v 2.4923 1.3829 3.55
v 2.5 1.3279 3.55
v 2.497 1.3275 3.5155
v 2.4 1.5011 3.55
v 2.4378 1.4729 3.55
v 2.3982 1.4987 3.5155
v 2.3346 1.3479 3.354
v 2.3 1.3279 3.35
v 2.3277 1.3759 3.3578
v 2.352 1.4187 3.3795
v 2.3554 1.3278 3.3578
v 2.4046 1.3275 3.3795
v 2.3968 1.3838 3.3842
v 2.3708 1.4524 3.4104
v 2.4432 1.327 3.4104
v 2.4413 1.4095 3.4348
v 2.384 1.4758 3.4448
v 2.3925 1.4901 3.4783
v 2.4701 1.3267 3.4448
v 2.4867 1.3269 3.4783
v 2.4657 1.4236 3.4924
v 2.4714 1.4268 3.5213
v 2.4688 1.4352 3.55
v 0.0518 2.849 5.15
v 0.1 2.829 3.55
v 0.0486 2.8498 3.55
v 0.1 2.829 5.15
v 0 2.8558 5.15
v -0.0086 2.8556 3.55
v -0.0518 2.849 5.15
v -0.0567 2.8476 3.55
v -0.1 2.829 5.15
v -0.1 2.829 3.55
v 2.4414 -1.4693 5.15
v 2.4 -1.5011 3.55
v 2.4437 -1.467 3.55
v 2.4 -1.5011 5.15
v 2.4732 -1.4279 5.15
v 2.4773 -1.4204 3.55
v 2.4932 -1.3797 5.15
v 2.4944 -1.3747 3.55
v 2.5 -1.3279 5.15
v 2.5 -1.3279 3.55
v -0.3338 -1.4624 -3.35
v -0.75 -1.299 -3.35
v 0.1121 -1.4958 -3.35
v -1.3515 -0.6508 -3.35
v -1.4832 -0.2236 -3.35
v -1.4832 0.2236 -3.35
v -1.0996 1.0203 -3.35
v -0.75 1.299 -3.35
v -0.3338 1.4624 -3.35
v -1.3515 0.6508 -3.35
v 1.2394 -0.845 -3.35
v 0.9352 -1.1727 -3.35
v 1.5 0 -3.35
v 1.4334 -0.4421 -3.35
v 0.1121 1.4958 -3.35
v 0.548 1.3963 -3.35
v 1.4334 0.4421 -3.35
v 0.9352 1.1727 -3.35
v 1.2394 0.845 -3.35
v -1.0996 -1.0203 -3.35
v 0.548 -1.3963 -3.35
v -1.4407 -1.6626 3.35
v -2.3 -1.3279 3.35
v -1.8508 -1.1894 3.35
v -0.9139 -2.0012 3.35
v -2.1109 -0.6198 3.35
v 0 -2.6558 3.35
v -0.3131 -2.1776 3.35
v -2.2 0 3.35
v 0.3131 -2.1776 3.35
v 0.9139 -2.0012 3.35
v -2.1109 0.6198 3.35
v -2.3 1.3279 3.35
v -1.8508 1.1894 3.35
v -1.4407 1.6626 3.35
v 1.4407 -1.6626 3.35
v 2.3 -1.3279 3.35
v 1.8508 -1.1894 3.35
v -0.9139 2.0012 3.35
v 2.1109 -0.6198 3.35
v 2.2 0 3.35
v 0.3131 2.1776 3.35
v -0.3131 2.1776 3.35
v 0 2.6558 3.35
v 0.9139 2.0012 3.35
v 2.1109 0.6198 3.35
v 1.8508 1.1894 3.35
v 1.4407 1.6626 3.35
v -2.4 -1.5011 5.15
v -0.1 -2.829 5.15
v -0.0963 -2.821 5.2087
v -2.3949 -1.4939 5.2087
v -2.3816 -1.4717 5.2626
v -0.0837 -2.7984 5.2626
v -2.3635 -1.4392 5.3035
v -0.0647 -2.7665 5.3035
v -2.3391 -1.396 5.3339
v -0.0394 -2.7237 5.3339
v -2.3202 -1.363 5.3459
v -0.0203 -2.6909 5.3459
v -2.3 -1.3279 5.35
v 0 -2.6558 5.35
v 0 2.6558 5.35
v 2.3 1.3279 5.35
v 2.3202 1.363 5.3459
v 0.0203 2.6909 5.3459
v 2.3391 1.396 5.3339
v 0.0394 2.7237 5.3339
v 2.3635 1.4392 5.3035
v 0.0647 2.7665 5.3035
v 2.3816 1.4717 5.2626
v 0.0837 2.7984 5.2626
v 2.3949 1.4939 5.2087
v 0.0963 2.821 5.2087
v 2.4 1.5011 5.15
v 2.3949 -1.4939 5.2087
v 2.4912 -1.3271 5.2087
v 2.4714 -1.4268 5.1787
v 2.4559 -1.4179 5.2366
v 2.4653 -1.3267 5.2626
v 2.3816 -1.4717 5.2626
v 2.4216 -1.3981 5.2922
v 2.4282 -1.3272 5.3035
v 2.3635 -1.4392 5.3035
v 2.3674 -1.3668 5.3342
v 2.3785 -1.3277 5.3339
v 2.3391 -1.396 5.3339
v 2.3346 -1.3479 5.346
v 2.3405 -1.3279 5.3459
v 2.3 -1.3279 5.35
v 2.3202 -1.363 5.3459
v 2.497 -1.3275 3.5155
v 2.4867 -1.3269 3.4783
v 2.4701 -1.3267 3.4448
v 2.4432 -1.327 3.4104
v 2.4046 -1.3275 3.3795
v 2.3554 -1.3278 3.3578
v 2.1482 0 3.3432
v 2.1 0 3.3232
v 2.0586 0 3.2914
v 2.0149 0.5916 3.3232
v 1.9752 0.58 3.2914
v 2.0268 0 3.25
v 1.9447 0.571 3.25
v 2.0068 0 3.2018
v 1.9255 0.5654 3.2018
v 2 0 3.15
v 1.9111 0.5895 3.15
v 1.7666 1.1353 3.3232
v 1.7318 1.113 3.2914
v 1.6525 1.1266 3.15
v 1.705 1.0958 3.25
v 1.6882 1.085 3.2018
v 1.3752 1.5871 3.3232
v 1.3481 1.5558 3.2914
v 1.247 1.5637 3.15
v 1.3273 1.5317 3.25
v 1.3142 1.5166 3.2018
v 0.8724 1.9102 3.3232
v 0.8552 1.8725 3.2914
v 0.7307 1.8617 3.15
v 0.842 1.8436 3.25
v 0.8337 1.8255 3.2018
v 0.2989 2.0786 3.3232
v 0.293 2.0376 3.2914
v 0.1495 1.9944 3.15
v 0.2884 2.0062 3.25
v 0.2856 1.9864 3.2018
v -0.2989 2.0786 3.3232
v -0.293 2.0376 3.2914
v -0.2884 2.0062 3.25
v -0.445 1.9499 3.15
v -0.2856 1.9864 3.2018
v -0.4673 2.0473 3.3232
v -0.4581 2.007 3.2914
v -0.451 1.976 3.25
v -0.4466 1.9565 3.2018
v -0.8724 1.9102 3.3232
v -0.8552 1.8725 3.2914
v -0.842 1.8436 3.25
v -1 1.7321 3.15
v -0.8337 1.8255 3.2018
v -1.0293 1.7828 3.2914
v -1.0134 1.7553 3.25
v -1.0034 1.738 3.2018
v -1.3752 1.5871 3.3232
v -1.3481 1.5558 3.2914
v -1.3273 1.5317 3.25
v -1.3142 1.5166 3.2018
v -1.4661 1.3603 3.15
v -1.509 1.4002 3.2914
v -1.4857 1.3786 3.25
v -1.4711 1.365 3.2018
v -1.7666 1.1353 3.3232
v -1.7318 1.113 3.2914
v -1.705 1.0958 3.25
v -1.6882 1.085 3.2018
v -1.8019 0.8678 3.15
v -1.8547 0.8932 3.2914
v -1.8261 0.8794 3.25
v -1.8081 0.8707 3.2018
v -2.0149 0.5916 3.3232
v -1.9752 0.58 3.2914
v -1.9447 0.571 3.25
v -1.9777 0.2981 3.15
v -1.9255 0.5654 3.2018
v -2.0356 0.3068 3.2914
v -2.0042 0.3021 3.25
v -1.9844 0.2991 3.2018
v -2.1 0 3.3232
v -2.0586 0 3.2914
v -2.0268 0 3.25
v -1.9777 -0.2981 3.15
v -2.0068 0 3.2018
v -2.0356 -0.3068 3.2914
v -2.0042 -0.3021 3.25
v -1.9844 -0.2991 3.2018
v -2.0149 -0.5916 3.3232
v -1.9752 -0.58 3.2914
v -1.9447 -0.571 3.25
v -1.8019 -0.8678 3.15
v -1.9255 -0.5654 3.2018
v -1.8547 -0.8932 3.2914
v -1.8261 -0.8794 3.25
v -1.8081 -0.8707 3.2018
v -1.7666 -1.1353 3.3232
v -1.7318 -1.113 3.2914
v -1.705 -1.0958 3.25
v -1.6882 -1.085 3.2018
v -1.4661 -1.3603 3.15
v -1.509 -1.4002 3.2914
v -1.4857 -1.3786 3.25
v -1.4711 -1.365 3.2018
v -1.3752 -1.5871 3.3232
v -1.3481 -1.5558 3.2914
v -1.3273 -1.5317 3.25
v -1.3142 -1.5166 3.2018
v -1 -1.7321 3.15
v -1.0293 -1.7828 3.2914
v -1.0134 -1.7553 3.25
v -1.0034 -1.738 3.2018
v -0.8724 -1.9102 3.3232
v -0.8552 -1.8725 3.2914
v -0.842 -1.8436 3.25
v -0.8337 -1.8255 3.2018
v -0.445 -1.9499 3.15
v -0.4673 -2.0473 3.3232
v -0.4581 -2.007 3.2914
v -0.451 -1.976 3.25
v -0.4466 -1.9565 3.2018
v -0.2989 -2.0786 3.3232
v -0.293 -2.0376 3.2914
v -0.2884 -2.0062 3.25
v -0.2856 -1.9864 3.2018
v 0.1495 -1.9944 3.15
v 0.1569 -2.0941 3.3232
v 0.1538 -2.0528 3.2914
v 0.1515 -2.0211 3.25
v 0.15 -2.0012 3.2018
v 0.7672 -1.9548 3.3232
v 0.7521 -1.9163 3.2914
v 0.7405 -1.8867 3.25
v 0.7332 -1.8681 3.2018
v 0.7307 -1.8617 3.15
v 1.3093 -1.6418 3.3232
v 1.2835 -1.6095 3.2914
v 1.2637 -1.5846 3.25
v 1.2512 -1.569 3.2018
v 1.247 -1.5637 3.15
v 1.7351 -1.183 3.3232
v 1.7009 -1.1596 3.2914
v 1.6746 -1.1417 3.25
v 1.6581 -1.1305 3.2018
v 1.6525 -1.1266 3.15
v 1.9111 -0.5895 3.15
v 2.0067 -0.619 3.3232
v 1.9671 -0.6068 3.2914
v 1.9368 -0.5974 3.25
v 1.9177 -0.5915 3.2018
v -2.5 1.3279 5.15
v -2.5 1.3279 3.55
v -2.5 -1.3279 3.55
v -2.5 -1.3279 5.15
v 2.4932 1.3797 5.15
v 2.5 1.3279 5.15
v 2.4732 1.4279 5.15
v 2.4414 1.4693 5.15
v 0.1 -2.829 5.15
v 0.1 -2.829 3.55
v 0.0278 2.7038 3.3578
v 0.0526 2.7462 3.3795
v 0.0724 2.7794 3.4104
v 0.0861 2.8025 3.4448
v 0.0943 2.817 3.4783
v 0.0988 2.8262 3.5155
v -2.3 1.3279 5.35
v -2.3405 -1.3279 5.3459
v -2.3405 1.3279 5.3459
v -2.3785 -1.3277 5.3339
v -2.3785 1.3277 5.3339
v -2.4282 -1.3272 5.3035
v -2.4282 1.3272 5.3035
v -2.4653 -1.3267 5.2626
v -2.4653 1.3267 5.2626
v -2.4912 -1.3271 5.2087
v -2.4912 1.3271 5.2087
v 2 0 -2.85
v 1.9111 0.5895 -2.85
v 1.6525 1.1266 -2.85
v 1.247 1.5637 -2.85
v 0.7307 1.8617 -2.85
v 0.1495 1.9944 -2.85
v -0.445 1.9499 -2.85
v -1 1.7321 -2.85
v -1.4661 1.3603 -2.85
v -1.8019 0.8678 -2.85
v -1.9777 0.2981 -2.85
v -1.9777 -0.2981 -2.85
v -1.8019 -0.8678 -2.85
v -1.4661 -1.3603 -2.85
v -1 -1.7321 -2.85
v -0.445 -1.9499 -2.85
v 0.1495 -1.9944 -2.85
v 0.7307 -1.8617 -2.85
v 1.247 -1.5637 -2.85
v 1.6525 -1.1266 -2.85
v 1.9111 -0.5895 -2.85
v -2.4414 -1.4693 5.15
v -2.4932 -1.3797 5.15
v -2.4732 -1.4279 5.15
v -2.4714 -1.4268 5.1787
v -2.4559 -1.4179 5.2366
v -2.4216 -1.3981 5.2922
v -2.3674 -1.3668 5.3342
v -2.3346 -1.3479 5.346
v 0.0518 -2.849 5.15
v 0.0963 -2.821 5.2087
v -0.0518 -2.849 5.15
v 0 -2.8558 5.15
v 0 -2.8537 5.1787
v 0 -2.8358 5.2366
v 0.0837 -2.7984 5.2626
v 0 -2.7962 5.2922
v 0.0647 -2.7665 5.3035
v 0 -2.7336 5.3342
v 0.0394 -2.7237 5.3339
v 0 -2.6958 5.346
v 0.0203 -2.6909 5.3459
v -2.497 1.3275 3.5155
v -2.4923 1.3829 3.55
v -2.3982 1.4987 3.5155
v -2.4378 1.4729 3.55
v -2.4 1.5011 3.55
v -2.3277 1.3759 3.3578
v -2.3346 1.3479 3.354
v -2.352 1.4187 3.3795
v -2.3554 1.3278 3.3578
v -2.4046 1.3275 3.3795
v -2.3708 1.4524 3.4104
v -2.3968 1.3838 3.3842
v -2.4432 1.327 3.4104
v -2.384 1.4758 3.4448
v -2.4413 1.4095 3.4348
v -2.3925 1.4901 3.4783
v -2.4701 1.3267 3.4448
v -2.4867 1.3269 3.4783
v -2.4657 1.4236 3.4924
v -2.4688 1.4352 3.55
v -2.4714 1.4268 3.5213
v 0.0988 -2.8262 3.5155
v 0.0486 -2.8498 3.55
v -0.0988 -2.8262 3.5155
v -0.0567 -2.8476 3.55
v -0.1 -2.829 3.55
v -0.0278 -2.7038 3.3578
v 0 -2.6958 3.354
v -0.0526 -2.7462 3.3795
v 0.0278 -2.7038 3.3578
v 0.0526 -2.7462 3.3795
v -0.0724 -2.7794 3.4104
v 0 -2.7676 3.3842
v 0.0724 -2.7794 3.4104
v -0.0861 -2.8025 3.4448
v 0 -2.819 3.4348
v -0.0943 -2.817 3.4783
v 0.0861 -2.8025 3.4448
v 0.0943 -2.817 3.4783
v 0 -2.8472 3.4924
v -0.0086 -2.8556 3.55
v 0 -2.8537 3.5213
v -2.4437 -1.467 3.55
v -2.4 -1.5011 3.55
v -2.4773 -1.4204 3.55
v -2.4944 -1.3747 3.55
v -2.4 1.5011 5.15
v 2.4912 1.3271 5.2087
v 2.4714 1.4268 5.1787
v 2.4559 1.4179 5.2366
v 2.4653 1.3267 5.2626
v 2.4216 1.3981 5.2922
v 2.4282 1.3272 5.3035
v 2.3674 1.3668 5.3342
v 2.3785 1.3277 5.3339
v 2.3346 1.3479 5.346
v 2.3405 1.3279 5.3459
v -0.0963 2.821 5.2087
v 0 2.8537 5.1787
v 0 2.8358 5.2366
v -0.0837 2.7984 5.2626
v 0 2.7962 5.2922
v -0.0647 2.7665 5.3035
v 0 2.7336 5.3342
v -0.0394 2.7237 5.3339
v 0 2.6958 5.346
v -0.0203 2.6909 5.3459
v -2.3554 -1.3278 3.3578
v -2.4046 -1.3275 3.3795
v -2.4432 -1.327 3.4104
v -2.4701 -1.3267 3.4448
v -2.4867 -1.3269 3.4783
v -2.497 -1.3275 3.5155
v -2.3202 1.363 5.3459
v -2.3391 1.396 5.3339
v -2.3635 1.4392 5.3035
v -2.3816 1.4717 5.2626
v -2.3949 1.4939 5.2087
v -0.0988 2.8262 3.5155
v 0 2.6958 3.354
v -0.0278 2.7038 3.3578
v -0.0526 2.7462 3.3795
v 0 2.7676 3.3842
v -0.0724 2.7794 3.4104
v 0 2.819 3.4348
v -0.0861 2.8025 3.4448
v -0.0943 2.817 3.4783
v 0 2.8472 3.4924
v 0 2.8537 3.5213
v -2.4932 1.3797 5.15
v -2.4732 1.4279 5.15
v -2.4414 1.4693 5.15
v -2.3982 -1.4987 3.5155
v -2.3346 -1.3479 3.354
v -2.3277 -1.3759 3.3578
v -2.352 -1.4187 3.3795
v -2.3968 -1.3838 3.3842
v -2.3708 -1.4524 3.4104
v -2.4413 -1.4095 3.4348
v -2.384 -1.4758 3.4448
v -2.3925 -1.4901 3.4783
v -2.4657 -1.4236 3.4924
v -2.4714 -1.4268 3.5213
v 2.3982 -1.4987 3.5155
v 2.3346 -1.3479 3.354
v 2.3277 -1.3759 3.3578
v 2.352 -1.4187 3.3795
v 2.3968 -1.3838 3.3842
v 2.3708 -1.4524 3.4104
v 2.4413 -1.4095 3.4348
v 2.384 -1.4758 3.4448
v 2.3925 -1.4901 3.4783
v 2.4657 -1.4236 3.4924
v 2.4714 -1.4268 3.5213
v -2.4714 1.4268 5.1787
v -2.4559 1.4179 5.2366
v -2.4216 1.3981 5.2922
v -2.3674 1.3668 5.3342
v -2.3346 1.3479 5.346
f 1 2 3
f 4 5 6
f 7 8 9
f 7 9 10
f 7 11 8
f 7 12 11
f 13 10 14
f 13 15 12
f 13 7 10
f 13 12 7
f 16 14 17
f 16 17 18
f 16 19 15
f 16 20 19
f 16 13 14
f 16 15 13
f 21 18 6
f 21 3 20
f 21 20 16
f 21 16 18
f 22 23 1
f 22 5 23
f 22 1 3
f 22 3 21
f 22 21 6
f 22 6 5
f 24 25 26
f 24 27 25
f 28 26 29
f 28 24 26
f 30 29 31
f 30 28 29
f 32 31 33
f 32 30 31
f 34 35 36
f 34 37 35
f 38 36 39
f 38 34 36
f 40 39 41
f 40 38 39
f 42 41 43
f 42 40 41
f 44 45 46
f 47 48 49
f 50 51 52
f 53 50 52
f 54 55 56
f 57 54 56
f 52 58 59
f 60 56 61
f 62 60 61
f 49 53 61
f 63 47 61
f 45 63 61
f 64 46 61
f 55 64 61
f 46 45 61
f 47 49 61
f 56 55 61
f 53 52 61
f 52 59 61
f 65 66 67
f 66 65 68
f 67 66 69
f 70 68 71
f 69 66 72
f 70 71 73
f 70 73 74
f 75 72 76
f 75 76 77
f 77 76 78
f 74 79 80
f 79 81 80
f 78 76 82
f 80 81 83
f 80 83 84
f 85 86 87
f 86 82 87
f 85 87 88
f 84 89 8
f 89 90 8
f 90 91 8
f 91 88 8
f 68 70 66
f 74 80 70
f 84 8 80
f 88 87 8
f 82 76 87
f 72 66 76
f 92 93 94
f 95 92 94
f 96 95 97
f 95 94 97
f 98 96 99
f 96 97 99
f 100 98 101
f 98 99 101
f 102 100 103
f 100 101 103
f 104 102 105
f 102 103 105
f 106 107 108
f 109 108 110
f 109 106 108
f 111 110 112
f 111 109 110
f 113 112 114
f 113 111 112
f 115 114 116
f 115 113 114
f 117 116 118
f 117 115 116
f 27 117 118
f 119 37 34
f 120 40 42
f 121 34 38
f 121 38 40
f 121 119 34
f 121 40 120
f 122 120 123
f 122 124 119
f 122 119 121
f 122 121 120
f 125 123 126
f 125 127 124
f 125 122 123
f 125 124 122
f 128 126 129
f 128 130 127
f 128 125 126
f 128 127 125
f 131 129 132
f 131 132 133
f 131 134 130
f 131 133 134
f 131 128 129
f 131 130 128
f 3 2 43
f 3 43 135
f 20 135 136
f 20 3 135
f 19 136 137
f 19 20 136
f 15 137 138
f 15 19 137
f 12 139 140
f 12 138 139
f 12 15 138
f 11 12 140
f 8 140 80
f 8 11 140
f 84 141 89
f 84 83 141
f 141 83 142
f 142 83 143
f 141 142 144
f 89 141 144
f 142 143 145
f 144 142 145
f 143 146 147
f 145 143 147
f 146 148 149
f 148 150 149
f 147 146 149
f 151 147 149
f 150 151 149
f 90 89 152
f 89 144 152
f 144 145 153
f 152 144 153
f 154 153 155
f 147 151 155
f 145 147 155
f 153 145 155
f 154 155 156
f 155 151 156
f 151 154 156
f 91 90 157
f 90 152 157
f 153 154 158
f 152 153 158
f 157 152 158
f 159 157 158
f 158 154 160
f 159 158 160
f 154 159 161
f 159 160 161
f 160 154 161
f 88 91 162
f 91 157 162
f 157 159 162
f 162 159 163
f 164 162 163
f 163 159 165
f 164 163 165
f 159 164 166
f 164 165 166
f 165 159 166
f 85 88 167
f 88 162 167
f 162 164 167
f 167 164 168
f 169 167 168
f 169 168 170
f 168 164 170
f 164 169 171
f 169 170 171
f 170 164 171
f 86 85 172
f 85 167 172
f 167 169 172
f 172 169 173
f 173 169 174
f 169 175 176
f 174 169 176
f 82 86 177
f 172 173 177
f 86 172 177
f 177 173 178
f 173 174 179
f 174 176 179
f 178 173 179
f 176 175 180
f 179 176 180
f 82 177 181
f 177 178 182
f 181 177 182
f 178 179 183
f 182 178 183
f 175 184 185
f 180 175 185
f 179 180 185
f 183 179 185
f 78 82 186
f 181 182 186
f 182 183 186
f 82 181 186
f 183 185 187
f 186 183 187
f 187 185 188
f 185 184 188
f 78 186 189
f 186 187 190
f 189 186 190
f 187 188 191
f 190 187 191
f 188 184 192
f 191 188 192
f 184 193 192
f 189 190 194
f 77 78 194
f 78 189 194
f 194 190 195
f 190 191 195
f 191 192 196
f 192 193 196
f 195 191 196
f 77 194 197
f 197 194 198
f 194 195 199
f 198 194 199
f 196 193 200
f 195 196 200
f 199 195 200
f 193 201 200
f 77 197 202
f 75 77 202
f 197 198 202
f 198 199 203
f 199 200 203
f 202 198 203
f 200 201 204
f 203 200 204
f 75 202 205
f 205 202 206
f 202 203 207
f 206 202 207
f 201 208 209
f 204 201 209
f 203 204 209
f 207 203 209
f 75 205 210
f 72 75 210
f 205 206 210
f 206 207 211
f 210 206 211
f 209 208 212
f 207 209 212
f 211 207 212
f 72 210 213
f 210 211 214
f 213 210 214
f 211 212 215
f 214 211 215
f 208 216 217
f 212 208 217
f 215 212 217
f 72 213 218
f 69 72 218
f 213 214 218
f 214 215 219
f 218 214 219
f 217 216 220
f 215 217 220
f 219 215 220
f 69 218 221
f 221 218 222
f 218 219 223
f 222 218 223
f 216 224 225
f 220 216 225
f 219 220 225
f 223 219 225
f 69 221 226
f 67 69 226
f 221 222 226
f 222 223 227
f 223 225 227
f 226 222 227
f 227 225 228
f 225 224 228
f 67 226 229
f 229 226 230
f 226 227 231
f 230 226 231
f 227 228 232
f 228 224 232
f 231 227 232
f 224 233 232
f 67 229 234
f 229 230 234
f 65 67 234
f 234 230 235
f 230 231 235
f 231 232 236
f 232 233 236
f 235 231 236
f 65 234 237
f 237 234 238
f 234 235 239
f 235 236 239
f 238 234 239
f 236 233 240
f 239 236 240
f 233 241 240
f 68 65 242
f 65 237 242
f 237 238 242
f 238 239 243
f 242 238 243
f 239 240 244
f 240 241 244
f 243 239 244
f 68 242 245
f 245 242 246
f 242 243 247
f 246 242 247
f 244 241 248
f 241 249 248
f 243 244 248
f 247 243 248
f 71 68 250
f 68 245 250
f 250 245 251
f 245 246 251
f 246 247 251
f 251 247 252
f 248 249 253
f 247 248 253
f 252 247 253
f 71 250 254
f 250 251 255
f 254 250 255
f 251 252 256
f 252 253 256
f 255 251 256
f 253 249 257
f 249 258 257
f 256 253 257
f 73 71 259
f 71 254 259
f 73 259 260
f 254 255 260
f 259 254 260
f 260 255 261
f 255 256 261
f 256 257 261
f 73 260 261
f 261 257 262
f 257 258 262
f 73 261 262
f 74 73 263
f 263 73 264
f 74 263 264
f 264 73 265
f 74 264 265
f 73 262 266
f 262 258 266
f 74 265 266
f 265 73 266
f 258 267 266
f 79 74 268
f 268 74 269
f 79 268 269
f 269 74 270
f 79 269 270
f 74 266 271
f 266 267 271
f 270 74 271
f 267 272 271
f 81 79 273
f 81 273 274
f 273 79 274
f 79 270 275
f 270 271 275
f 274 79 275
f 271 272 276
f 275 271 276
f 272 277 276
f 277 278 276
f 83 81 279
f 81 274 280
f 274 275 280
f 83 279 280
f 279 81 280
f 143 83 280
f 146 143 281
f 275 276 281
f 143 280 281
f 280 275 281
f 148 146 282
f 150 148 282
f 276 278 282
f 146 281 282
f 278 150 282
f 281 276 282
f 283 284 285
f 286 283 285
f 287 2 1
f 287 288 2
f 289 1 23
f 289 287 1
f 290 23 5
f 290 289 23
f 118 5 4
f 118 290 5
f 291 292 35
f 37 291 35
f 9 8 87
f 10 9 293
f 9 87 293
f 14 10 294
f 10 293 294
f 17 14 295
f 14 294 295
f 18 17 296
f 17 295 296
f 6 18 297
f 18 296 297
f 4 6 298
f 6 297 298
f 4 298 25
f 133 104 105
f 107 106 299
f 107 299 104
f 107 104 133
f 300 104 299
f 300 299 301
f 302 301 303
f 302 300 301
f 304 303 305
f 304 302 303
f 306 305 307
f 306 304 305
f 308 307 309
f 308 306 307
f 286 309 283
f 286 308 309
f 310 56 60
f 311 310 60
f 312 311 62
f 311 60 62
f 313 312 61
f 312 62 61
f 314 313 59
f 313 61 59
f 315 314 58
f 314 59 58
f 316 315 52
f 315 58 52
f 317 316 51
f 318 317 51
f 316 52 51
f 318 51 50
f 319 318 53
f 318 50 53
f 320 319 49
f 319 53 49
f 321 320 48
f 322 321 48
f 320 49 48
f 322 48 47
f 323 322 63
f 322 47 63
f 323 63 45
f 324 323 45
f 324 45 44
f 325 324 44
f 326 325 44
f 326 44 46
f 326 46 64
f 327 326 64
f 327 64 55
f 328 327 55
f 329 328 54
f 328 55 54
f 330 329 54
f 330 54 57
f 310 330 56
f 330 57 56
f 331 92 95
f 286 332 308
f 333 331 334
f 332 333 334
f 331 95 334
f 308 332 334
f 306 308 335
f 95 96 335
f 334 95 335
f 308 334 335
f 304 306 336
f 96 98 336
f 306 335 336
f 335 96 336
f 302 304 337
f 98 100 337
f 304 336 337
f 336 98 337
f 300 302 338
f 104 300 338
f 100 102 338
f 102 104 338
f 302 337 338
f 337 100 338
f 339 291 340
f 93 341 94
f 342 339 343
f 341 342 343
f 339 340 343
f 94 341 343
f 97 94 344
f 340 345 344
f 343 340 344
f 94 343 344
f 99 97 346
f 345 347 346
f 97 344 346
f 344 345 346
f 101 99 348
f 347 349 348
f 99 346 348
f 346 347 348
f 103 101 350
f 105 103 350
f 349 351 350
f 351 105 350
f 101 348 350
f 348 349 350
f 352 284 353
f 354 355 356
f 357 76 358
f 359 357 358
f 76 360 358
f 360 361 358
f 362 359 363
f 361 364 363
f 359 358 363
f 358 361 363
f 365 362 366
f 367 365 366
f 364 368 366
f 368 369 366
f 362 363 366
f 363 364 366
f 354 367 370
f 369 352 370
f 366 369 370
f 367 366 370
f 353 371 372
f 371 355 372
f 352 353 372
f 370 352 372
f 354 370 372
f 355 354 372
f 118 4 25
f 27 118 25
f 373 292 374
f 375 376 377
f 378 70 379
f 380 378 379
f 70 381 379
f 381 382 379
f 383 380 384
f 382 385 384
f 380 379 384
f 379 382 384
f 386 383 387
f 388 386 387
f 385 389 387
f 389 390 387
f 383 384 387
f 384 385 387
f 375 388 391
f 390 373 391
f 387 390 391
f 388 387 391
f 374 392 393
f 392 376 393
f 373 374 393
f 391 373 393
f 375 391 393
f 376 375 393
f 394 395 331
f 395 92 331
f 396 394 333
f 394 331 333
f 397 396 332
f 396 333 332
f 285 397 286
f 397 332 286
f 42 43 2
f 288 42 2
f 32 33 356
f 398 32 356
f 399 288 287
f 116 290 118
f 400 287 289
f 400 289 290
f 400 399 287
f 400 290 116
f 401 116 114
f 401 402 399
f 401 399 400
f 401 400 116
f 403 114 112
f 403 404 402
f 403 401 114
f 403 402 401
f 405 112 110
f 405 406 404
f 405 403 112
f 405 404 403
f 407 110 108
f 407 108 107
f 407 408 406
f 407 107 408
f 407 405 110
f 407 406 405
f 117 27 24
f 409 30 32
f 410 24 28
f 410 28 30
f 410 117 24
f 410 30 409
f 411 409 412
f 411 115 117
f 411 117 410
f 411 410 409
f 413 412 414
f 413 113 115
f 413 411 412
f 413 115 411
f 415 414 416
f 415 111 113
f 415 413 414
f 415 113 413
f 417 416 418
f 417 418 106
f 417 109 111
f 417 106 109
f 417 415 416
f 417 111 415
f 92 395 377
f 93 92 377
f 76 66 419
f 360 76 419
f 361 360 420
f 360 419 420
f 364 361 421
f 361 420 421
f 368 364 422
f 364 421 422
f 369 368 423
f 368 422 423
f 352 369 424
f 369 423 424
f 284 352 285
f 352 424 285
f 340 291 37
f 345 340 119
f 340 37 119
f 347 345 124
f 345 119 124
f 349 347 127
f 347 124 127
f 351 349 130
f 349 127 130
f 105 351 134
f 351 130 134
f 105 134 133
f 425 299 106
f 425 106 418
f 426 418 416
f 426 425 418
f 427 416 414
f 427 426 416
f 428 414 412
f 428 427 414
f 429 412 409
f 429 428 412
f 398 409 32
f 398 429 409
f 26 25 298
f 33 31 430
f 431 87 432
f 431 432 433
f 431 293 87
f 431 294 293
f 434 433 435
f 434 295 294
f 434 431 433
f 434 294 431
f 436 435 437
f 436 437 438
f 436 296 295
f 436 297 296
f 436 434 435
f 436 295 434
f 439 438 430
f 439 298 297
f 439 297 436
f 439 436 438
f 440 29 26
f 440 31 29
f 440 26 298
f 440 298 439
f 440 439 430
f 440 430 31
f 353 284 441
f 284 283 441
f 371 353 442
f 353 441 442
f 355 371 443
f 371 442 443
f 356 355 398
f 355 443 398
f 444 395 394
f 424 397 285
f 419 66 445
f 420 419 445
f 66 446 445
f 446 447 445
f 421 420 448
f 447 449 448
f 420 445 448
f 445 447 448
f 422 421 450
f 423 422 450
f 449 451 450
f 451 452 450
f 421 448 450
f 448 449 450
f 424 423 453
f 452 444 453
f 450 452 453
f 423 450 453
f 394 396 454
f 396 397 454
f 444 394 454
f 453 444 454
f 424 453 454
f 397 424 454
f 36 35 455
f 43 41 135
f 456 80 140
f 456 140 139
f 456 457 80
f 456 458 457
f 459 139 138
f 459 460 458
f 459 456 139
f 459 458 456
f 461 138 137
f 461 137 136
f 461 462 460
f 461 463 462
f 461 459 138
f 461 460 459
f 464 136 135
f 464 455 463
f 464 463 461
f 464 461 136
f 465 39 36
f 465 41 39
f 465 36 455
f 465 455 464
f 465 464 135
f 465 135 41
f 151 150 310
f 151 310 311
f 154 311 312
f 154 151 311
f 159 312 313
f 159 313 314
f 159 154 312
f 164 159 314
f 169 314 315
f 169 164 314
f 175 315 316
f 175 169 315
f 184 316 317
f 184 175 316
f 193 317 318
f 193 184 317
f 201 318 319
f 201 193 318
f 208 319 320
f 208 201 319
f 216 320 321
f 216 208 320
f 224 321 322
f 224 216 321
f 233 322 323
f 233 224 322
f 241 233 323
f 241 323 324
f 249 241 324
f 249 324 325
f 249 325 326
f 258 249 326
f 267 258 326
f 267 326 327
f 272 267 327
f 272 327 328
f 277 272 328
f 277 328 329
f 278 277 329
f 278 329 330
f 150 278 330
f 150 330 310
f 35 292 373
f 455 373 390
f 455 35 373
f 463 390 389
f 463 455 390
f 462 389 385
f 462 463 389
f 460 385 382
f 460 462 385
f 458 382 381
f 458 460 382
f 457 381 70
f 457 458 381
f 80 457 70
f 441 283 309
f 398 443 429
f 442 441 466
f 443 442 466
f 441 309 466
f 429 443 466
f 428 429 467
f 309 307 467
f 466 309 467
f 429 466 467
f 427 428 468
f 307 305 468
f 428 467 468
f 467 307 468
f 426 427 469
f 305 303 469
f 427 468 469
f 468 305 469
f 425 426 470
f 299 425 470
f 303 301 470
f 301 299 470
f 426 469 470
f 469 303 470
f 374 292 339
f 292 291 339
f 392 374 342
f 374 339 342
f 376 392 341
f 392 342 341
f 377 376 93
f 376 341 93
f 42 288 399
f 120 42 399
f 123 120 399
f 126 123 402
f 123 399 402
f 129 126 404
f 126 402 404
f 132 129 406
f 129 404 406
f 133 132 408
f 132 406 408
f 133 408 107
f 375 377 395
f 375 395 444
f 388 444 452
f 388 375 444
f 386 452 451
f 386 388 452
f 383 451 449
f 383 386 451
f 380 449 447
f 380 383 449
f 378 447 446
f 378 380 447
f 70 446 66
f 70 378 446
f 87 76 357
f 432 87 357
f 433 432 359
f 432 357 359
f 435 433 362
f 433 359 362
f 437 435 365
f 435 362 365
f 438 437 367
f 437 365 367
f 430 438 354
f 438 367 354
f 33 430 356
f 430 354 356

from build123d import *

# Parameters (mm, degrees)
SKETCH1_R           = 2
BOSS_EXTRUDE1_DEPTH = 3.35
BOSS_EXTRUDE2_DEPTH = 2
FILLET1_R           = 0.2
FILLET2_R           = 0.2
CHAMFER1_SIZE       = 0.5


with BuildPart() as part:
    # Sketch1 → Boss-Extrude1 (new body, symmetric)
    with BuildSketch(Plane.XY):
        Circle(SKETCH1_R)
    extrude(amount=BOSS_EXTRUDE1_DEPTH, both=True)

    # Sketch2 → Boss-Extrude2 (add)
    with BuildSketch(Plane.XY.offset(3.35)):
        Polygon((0, -2.886751346), (2.5, -1.443375673), (2.5, 1.443375673), (0, 2.886751346), (-2.5, 1.443375673), (-2.5, -1.443375673), align=None)
    extrude(amount=BOSS_EXTRUDE2_DEPTH)

    # Fillet1
    fillet1_edges = [part.edges().sort_by_distance(p)[0] for p in [
        (-2, 0, 3.35),
        (-1.25, -2.165063509, 3.35),
        (1.25, -2.165063509, 3.35),
        (2.5, 0, 3.35),
        (1.25, 2.165063509, 3.35),
        (-1.25, 2.165063509, 3.35),
        (-2.5, 0, 3.35),
        (-1.25, -2.165063509, 5.35),
        (1.25, -2.165063509, 5.35),
        (2.5, 0, 5.35),
        (1.25, 2.165063509, 5.35),
        (-1.25, 2.165063509, 5.35),
        (-2.5, 0, 5.35),
    ]]
    fillet(fillet1_edges, radius=FILLET1_R)

    # Fillet2
    fillet2_edges = [part.edges().sort_by_distance(p)[0] for p in [
        (-2.5, -1.443375673, 4.35),
        (-2.5, 1.443375673, 4.35),
        (0, 2.886751346, 4.35),
        (2.5, 1.443375673, 4.35),
        (2.5, -1.443375673, 4.35),
        (0, -2.886751346, 4.35),
        (2.436285816, 1.406590271, 5.29637683),
        (2.436285816, -1.406590271, 5.29637683),
        (0, 2.813180543, 5.29637683),
        (0, -2.813180543, 5.29637683),
        (-2.436285816, 1.406590271, 5.29637683),
        (-2.436285816, -1.406590271, 5.29637683),
        (-2.436285816, 1.406590271, 3.40362317),
        (0, 2.813180543, 3.40362317),
        (-2.436285816, -1.406590271, 3.40362317),
        (2.436285816, 1.406590271, 3.40362317),
        (0, -2.813180543, 3.40362317),
        (2.436285816, -1.406590271, 3.40362317),
    ]]
    fillet(fillet2_edges, radius=FILLET2_R)

    # Chamfer1
    chamfer1_edges = [part.edges().sort_by_distance(p)[0] for p in [
        (-2, 0, -3.35),
    ]]
    chamfer(chamfer1_edges, length=CHAMFER1_SIZE)


solid = part.part
